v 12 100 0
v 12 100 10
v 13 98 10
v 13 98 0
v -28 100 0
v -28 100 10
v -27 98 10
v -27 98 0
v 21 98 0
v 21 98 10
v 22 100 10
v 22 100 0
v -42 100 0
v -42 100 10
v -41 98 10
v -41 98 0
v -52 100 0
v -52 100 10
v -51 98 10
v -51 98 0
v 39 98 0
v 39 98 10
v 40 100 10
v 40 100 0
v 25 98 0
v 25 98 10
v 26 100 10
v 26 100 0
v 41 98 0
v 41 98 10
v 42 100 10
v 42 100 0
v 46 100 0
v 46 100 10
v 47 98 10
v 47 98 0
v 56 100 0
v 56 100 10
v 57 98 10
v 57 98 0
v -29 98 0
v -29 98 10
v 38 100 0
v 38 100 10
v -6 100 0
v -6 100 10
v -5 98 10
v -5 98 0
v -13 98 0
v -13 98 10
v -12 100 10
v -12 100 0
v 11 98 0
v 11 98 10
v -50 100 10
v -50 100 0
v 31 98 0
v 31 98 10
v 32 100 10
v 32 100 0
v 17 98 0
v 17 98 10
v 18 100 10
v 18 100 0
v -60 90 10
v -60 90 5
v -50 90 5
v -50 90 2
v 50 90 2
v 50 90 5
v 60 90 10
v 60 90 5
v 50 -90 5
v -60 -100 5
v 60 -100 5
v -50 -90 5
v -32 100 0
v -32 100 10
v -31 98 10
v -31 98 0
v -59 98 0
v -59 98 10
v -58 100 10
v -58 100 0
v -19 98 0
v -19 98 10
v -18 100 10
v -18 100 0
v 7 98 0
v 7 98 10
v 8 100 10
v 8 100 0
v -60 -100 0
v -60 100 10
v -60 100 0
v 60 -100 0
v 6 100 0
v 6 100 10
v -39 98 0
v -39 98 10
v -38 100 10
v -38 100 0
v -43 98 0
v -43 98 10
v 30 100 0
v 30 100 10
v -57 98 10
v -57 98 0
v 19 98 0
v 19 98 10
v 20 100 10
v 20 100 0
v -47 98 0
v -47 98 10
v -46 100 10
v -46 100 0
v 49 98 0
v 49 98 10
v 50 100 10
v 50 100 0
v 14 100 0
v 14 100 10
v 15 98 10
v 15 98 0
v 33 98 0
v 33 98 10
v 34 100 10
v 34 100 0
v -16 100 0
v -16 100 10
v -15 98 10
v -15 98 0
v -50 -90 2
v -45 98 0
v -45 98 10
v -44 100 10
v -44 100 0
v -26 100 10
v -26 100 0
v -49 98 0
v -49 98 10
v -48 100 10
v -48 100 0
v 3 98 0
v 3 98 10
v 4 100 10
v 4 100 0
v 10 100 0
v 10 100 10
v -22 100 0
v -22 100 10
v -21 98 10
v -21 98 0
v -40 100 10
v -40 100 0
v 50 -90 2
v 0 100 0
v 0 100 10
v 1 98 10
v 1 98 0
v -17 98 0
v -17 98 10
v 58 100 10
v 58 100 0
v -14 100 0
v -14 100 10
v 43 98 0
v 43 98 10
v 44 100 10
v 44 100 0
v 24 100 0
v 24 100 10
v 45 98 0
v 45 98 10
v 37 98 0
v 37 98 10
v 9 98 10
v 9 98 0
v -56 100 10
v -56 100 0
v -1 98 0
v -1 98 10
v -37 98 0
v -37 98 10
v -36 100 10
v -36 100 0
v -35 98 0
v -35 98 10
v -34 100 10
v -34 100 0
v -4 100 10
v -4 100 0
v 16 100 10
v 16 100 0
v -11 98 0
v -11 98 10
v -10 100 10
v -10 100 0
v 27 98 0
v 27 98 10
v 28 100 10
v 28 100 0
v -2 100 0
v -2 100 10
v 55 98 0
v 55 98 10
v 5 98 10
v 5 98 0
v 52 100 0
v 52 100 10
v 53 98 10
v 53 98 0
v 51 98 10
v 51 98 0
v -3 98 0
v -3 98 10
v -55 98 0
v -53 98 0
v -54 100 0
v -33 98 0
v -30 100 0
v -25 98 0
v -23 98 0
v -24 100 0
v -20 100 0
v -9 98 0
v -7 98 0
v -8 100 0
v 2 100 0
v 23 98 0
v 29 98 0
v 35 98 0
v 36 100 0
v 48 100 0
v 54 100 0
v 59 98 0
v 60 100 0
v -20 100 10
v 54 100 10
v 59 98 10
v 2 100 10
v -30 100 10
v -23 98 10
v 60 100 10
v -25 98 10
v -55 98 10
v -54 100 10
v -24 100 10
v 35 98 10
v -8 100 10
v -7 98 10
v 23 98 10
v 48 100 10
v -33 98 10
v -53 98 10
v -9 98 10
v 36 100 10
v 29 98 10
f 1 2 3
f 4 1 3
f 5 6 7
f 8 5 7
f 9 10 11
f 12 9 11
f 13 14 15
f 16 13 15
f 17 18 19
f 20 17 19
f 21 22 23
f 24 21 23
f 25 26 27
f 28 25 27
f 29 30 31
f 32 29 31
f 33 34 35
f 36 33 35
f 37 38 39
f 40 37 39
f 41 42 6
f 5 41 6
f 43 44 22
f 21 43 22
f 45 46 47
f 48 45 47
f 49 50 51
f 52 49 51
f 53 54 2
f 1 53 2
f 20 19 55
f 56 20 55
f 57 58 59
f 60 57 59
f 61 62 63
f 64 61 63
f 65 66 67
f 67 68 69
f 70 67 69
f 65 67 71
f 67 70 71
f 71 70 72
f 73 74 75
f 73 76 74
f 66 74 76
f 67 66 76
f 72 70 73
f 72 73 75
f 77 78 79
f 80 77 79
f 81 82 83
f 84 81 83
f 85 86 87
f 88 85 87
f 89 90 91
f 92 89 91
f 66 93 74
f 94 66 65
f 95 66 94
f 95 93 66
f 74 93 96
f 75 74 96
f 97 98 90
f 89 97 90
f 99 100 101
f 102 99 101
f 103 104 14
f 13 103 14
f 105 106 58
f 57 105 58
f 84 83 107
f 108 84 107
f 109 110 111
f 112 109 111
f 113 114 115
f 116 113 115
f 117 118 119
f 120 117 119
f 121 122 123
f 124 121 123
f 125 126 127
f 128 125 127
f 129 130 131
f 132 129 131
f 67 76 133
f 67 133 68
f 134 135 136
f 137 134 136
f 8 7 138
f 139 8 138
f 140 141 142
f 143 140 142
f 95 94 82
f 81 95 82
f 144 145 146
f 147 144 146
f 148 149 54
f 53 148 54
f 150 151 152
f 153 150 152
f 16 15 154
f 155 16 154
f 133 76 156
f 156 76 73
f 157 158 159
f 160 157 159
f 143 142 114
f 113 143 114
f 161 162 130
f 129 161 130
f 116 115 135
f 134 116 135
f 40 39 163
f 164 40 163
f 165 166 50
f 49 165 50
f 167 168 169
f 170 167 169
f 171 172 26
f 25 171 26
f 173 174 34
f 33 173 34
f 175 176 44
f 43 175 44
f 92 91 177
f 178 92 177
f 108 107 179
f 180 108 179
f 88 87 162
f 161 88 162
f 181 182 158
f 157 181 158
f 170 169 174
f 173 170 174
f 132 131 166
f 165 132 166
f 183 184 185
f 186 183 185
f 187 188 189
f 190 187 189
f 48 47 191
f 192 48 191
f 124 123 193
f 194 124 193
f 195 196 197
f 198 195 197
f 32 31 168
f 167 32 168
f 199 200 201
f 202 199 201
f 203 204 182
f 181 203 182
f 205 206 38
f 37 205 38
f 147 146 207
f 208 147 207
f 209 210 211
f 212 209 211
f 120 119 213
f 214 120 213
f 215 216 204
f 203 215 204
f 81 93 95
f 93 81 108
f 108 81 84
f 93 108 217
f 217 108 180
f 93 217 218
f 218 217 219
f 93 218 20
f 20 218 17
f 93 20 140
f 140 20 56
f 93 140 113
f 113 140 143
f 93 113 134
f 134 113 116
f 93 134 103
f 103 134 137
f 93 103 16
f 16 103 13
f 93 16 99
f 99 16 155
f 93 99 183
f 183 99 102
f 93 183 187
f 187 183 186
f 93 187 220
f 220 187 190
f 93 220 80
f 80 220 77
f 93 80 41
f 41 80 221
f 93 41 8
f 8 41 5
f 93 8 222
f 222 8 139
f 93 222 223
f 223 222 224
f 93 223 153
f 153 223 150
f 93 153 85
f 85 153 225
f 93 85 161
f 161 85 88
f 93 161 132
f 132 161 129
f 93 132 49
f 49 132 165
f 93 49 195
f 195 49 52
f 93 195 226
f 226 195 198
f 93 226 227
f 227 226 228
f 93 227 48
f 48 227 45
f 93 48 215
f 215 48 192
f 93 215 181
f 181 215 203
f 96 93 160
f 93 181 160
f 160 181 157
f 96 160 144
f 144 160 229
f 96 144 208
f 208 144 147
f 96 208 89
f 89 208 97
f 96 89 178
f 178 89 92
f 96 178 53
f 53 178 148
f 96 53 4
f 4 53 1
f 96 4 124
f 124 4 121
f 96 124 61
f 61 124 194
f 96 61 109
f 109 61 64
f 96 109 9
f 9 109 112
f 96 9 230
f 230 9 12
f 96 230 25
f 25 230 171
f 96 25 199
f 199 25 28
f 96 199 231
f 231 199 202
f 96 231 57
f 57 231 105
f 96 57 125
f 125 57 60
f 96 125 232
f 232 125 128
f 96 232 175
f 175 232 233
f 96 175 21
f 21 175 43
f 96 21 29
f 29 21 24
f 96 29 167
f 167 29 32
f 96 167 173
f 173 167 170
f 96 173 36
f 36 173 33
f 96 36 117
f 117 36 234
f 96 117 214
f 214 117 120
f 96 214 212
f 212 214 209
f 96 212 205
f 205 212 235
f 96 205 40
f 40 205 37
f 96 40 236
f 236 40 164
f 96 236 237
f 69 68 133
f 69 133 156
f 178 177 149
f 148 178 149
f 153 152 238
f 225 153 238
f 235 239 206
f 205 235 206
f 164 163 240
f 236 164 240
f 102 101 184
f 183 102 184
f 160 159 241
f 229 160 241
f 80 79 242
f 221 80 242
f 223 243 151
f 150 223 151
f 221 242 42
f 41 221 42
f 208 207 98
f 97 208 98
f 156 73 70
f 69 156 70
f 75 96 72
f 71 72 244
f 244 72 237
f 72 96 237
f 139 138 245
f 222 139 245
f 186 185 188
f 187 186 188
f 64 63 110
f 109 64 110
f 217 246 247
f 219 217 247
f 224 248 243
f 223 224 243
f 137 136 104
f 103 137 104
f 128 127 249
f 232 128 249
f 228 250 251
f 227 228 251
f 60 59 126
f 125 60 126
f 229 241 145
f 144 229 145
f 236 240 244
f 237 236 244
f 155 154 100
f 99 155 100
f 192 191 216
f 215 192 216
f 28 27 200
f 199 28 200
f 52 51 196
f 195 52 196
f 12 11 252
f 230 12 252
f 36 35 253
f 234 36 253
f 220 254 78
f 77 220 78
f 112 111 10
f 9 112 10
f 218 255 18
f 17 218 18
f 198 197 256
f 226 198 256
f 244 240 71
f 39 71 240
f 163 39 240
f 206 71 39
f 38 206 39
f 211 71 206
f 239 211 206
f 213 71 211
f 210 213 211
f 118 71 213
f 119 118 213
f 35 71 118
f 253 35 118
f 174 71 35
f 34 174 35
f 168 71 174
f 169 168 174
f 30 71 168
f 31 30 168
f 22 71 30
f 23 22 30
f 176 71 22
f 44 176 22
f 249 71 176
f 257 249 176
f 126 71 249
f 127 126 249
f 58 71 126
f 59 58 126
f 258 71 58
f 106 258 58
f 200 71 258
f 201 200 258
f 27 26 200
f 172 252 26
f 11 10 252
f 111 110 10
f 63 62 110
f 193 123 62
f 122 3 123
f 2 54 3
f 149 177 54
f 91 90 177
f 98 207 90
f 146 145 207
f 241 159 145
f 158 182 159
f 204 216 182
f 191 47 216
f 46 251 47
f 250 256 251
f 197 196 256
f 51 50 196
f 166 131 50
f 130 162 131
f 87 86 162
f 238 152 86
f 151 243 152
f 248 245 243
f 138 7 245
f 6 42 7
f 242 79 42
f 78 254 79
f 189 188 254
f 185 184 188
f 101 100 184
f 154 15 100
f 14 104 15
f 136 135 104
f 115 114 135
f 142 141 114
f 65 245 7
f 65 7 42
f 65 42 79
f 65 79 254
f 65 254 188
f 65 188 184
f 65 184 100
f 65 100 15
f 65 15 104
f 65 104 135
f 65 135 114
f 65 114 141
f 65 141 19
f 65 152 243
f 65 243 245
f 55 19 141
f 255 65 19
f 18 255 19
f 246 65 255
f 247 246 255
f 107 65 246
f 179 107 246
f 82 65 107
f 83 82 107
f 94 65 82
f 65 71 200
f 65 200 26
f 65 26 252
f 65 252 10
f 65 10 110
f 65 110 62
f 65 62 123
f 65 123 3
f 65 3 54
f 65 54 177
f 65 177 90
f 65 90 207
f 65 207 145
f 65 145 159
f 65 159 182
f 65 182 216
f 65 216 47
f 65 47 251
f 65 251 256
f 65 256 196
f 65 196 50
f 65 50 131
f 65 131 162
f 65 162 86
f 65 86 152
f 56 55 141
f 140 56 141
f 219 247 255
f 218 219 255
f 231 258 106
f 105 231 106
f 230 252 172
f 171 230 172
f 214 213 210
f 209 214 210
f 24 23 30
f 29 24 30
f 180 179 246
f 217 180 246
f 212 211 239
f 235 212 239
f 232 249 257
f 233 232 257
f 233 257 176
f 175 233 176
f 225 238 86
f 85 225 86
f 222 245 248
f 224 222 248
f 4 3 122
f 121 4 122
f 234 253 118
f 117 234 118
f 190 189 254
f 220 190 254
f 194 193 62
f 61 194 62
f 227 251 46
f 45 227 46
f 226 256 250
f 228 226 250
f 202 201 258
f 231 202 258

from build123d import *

# Parameters (mm, degrees)
CROQUIS2_W              = 120
CROQUIS2_H              = 200
SALIENTE_EXTRUIR1_DEPTH = 5
CROQUIS3_W              = 100
CROQUIS3_H              = 180
CORTAR_EXTRUIR1_DEPTH   = 3
CROQUIS4_W              = 120
CROQUIS4_H              = 10
SALIENTE_EXTRUIR3_DEPTH = 5
CORTAR_EXTRUIR2_DEPTH   = 10
CROQUIS6_W              = 5
CROQUIS6_H              = 10
SALIENTE_EXTRUIR4_DEPTH = 120
CORTAR_EXTRUIR3_DEPTH   = 10


with BuildPart() as part:
    # Croquis2 → Saliente-Extruir1 (new body)
    with BuildSketch(Plane.XY):
        Rectangle(CROQUIS2_W, CROQUIS2_H)
    extrude(amount=SALIENTE_EXTRUIR1_DEPTH)

    # Croquis3 → Cortar-Extruir1 (cut)
    with BuildSketch(Plane.XY.offset(5)):
        Rectangle(CROQUIS3_W, CROQUIS3_H)
    extrude(amount=-CORTAR_EXTRUIR1_DEPTH, mode=Mode.SUBTRACT)

    # Croquis4 → Saliente-Extruir3 (add)
    with BuildSketch(Plane.XY.offset(5)):
        with Locations((0, 95)):
            Rectangle(CROQUIS4_W, CROQUIS4_H)
    extrude(amount=SALIENTE_EXTRUIR3_DEPTH)

    # Croquis5 → Cortar-Extruir2 (cut)
    with BuildSketch(Plane(origin=(0, 100, 0), x_dir=(1, 0, 0), z_dir=(0, 1, 0))):
        Polygon((59, -8), (58, -10), (60, -10), align=None)
        Polygon((57, -8), (56, -10), (58, -10), align=None)
        Polygon((55, -8), (54, -10), (56, -10), align=None)
        Polygon((53, -8), (52, -10), (54, -10), align=None)
        Polygon((51, -8), (50, -10), (52, -10), align=None)
        Polygon((49, -8), (48, -10), (50, -10), align=None)
        Polygon((47, -8), (46, -10), (48, -10), align=None)
        Polygon((45, -8), (44, -10), (46, -10), align=None)
        Polygon((43, -8), (42, -10), (44, -10), align=None)
        Polygon((41, -8), (40, -10), (42, -10), align=None)
        Polygon((39, -8), (38, -10), (40, -10), align=None)
        Polygon((37, -8), (36, -10), (38, -10), align=None)
        Polygon((35, -8), (34, -10), (36, -10), align=None)
        Polygon((33, -8), (32, -10), (34, -10), align=None)
        Polygon((31, -8), (30, -10), (32, -10), align=None)
        Polygon((29, -8), (28, -10), (30, -10), align=None)
        Polygon((27, -8), (26, -10), (28, -10), align=None)
        Polygon((25, -8), (24, -10), (26, -10), align=None)
        Polygon((23, -8), (22, -10), (24, -10), align=None)
        Polygon((21, -8), (20, -10), (22, -10), align=None)
        Polygon((19, -8), (18, -10), (20, -10), align=None)
        Polygon((17, -8), (16, -10), (18, -10), align=None)
        Polygon((15, -8), (14, -10), (16, -10), align=None)
        Polygon((13, -8), (12, -10), (14, -10), align=None)
        Polygon((11, -8), (10, -10), (12, -10), align=None)
        Polygon((9, -8), (8, -10), (10, -10), align=None)
        Polygon((7, -8), (6, -10), (8, -10), align=None)
        Polygon((5, -8), (4, -10), (6, -10), align=None)
        Polygon((3, -8), (2, -10), (4, -10), align=None)
        Polygon((1, -8), (0, -10), (2, -10), align=None)
        Polygon((-1, -8), (-2, -10), (0, -10), align=None)
        Polygon((-3, -8), (-4, -10), (-2, -10), align=None)
        Polygon((-5, -8), (-6, -10), (-4, -10), align=None)
        Polygon((-7, -8), (-8, -10), (-6, -10), align=None)
        Polygon((-9, -8), (-10, -10), (-8, -10), align=None)
        Polygon((-11, -8), (-12, -10), (-10, -10), align=None)
        Polygon((-13, -8), (-14, -10), (-12, -10), align=None)
        Polygon((-15, -8), (-16, -10), (-14, -10), align=None)
        Polygon((-17, -8), (-18, -10), (-16, -10), align=None)
        Polygon((-19, -8), (-20, -10), (-18, -10), align=None)
        Polygon((-21, -8), (-22, -10), (-20, -10), align=None)
        Polygon((-23, -8), (-24, -10), (-22, -10), align=None)
        Polygon((-25, -8), (-26, -10), (-24, -10), align=None)
        Polygon((-27, -8), (-28, -10), (-26, -10), align=None)
        Polygon((-29, -8), (-30, -10), (-28, -10), align=None)
        Polygon((-31, -8), (-32, -10), (-30, -10), align=None)
        Polygon((-33, -8), (-34, -10), (-32, -10), align=None)
        Polygon((-35, -8), (-36, -10), (-34, -10), align=None)
        Polygon((-37, -8), (-38, -10), (-36, -10), align=None)
        Polygon((-39, -8), (-40, -10), (-38, -10), align=None)
        Polygon((-41, -8), (-42, -10), (-40, -10), align=None)
        Polygon((-43, -8), (-44, -10), (-42, -10), align=None)
        Polygon((-45, -8), (-46, -10), (-44, -10), align=None)
        Polygon((-47, -8), (-48, -10), (-46, -10), align=None)
        Polygon((-49, -8), (-50, -10), (-48, -10), align=None)
        Polygon((-51, -8), (-52, -10), (-50, -10), align=None)
        Polygon((-53, -8), (-54, -10), (-52, -10), align=None)
        Polygon((-55, -8), (-56, -10), (-54, -10), align=None)
        Polygon((-57, -8), (-58, -10), (-56, -10), align=None)
        Polygon((-59, -8), (-60, -10), (-58, -10), align=None)
    extrude(amount=-CORTAR_EXTRUIR2_DEPTH, mode=Mode.SUBTRACT)

    # Croquis6 → Saliente-Extruir4 (add)
    with BuildSketch(Plane.ZY.offset(60)):
        with Locations((7.5, 95)):
            Rectangle(CROQUIS6_W, CROQUIS6_H)
    extrude(amount=-SALIENTE_EXTRUIR4_DEPTH)

    # Croquis7 → Cortar-Extruir3 (cut)
    with BuildSketch(Plane.XY.offset(10)):
        Polygon((-58, 100), (-60, 100), (-59, 98), align=None)
        Polygon((60, 100), (58, 100), (59, 98), align=None)
        Polygon((58, 100), (56, 100), (57, 98), align=None)
        Polygon((56, 100), (54, 100), (55, 98), align=None)
        Polygon((54, 100), (52, 100), (53, 98), align=None)
        Polygon((52, 100), (50, 100), (51, 98), align=None)
        Polygon((50, 100), (48, 100), (49, 98), align=None)
        Polygon((48, 100), (46, 100), (47, 98), align=None)
        Polygon((46, 100), (44, 100), (45, 98), align=None)
        Polygon((44, 100), (42, 100), (43, 98), align=None)
        Polygon((42, 100), (40, 100), (41, 98), align=None)
        Polygon((40, 100), (38, 100), (39, 98), align=None)
        Polygon((38, 100), (36, 100), (37, 98), align=None)
        Polygon((36, 100), (34, 100), (35, 98), align=None)
        Polygon((34, 100), (32, 100), (33, 98), align=None)
        Polygon((32, 100), (30, 100), (31, 98), align=None)
        Polygon((30, 100), (28, 100), (29, 98), align=None)
        Polygon((28, 100), (26, 100), (27, 98), align=None)
        Polygon((26, 100), (24, 100), (25, 98), align=None)
        Polygon((24, 100), (22, 100), (23, 98), align=None)
        Polygon((22, 100), (20, 100), (21, 98), align=None)
        Polygon((20, 100), (18, 100), (19, 98), align=None)
        Polygon((18, 100), (16, 100), (17, 98), align=None)
        Polygon((16, 100), (14, 100), (15, 98), align=None)
        Polygon((14, 100), (12, 100), (13, 98), align=None)
        Polygon((12, 100), (10, 100), (11, 98), align=None)
        Polygon((10, 100), (8, 100), (9, 98), align=None)
        Polygon((8, 100), (6, 100), (7, 98), align=None)
        Polygon((6, 100), (4, 100), (5, 98), align=None)
        Polygon((4, 100), (2, 100), (3, 98), align=None)
        Polygon((2, 100), (0, 100), (1, 98), align=None)
        Polygon((0, 100), (-2, 100), (-1, 98), align=None)
        Polygon((-2, 100), (-4, 100), (-3, 98), align=None)
        Polygon((-4, 100), (-6, 100), (-5, 98), align=None)
        Polygon((-6, 100), (-8, 100), (-7, 98), align=None)
        Polygon((-8, 100), (-10, 100), (-9, 98), align=None)
        Polygon((-10, 100), (-12, 100), (-11, 98), align=None)
        Polygon((-12, 100), (-14, 100), (-13, 98), align=None)
        Polygon((-14, 100), (-16, 100), (-15, 98), align=None)
        Polygon((-16, 100), (-18, 100), (-17, 98), align=None)
        Polygon((-18, 100), (-20, 100), (-19, 98), align=None)
        Polygon((-20, 100), (-22, 100), (-21, 98), align=None)
        Polygon((-22, 100), (-24, 100), (-23, 98), align=None)
        Polygon((-24, 100), (-26, 100), (-25, 98), align=None)
        Polygon((-26, 100), (-28, 100), (-27, 98), align=None)
        Polygon((-28, 100), (-30, 100), (-29, 98), align=None)
        Polygon((-30, 100), (-32, 100), (-31, 98), align=None)
        Polygon((-32, 100), (-34, 100), (-33, 98), align=None)
        Polygon((-34, 100), (-36, 100), (-35, 98), align=None)
        Polygon((-36, 100), (-38, 100), (-37, 98), align=None)
        Polygon((-38, 100), (-40, 100), (-39, 98), align=None)
        Polygon((-40, 100), (-42, 100), (-41, 98), align=None)
        Polygon((-42, 100), (-44, 100), (-43, 98), align=None)
        Polygon((-44, 100), (-46, 100), (-45, 98), align=None)
        Polygon((-46, 100), (-48, 100), (-47, 98), align=None)
        Polygon((-48, 100), (-50, 100), (-49, 98), align=None)
        Polygon((-50, 100), (-52, 100), (-51, 98), align=None)
        Polygon((-52, 100), (-54, 100), (-53, 98), align=None)
        Polygon((-54, 100), (-56, 100), (-55, 98), align=None)
        Polygon((-56, 100), (-58, 100), (-57, 98), align=None)
    extrude(amount=-CORTAR_EXTRUIR3_DEPTH, mode=Mode.SUBTRACT)


solid = part.part
